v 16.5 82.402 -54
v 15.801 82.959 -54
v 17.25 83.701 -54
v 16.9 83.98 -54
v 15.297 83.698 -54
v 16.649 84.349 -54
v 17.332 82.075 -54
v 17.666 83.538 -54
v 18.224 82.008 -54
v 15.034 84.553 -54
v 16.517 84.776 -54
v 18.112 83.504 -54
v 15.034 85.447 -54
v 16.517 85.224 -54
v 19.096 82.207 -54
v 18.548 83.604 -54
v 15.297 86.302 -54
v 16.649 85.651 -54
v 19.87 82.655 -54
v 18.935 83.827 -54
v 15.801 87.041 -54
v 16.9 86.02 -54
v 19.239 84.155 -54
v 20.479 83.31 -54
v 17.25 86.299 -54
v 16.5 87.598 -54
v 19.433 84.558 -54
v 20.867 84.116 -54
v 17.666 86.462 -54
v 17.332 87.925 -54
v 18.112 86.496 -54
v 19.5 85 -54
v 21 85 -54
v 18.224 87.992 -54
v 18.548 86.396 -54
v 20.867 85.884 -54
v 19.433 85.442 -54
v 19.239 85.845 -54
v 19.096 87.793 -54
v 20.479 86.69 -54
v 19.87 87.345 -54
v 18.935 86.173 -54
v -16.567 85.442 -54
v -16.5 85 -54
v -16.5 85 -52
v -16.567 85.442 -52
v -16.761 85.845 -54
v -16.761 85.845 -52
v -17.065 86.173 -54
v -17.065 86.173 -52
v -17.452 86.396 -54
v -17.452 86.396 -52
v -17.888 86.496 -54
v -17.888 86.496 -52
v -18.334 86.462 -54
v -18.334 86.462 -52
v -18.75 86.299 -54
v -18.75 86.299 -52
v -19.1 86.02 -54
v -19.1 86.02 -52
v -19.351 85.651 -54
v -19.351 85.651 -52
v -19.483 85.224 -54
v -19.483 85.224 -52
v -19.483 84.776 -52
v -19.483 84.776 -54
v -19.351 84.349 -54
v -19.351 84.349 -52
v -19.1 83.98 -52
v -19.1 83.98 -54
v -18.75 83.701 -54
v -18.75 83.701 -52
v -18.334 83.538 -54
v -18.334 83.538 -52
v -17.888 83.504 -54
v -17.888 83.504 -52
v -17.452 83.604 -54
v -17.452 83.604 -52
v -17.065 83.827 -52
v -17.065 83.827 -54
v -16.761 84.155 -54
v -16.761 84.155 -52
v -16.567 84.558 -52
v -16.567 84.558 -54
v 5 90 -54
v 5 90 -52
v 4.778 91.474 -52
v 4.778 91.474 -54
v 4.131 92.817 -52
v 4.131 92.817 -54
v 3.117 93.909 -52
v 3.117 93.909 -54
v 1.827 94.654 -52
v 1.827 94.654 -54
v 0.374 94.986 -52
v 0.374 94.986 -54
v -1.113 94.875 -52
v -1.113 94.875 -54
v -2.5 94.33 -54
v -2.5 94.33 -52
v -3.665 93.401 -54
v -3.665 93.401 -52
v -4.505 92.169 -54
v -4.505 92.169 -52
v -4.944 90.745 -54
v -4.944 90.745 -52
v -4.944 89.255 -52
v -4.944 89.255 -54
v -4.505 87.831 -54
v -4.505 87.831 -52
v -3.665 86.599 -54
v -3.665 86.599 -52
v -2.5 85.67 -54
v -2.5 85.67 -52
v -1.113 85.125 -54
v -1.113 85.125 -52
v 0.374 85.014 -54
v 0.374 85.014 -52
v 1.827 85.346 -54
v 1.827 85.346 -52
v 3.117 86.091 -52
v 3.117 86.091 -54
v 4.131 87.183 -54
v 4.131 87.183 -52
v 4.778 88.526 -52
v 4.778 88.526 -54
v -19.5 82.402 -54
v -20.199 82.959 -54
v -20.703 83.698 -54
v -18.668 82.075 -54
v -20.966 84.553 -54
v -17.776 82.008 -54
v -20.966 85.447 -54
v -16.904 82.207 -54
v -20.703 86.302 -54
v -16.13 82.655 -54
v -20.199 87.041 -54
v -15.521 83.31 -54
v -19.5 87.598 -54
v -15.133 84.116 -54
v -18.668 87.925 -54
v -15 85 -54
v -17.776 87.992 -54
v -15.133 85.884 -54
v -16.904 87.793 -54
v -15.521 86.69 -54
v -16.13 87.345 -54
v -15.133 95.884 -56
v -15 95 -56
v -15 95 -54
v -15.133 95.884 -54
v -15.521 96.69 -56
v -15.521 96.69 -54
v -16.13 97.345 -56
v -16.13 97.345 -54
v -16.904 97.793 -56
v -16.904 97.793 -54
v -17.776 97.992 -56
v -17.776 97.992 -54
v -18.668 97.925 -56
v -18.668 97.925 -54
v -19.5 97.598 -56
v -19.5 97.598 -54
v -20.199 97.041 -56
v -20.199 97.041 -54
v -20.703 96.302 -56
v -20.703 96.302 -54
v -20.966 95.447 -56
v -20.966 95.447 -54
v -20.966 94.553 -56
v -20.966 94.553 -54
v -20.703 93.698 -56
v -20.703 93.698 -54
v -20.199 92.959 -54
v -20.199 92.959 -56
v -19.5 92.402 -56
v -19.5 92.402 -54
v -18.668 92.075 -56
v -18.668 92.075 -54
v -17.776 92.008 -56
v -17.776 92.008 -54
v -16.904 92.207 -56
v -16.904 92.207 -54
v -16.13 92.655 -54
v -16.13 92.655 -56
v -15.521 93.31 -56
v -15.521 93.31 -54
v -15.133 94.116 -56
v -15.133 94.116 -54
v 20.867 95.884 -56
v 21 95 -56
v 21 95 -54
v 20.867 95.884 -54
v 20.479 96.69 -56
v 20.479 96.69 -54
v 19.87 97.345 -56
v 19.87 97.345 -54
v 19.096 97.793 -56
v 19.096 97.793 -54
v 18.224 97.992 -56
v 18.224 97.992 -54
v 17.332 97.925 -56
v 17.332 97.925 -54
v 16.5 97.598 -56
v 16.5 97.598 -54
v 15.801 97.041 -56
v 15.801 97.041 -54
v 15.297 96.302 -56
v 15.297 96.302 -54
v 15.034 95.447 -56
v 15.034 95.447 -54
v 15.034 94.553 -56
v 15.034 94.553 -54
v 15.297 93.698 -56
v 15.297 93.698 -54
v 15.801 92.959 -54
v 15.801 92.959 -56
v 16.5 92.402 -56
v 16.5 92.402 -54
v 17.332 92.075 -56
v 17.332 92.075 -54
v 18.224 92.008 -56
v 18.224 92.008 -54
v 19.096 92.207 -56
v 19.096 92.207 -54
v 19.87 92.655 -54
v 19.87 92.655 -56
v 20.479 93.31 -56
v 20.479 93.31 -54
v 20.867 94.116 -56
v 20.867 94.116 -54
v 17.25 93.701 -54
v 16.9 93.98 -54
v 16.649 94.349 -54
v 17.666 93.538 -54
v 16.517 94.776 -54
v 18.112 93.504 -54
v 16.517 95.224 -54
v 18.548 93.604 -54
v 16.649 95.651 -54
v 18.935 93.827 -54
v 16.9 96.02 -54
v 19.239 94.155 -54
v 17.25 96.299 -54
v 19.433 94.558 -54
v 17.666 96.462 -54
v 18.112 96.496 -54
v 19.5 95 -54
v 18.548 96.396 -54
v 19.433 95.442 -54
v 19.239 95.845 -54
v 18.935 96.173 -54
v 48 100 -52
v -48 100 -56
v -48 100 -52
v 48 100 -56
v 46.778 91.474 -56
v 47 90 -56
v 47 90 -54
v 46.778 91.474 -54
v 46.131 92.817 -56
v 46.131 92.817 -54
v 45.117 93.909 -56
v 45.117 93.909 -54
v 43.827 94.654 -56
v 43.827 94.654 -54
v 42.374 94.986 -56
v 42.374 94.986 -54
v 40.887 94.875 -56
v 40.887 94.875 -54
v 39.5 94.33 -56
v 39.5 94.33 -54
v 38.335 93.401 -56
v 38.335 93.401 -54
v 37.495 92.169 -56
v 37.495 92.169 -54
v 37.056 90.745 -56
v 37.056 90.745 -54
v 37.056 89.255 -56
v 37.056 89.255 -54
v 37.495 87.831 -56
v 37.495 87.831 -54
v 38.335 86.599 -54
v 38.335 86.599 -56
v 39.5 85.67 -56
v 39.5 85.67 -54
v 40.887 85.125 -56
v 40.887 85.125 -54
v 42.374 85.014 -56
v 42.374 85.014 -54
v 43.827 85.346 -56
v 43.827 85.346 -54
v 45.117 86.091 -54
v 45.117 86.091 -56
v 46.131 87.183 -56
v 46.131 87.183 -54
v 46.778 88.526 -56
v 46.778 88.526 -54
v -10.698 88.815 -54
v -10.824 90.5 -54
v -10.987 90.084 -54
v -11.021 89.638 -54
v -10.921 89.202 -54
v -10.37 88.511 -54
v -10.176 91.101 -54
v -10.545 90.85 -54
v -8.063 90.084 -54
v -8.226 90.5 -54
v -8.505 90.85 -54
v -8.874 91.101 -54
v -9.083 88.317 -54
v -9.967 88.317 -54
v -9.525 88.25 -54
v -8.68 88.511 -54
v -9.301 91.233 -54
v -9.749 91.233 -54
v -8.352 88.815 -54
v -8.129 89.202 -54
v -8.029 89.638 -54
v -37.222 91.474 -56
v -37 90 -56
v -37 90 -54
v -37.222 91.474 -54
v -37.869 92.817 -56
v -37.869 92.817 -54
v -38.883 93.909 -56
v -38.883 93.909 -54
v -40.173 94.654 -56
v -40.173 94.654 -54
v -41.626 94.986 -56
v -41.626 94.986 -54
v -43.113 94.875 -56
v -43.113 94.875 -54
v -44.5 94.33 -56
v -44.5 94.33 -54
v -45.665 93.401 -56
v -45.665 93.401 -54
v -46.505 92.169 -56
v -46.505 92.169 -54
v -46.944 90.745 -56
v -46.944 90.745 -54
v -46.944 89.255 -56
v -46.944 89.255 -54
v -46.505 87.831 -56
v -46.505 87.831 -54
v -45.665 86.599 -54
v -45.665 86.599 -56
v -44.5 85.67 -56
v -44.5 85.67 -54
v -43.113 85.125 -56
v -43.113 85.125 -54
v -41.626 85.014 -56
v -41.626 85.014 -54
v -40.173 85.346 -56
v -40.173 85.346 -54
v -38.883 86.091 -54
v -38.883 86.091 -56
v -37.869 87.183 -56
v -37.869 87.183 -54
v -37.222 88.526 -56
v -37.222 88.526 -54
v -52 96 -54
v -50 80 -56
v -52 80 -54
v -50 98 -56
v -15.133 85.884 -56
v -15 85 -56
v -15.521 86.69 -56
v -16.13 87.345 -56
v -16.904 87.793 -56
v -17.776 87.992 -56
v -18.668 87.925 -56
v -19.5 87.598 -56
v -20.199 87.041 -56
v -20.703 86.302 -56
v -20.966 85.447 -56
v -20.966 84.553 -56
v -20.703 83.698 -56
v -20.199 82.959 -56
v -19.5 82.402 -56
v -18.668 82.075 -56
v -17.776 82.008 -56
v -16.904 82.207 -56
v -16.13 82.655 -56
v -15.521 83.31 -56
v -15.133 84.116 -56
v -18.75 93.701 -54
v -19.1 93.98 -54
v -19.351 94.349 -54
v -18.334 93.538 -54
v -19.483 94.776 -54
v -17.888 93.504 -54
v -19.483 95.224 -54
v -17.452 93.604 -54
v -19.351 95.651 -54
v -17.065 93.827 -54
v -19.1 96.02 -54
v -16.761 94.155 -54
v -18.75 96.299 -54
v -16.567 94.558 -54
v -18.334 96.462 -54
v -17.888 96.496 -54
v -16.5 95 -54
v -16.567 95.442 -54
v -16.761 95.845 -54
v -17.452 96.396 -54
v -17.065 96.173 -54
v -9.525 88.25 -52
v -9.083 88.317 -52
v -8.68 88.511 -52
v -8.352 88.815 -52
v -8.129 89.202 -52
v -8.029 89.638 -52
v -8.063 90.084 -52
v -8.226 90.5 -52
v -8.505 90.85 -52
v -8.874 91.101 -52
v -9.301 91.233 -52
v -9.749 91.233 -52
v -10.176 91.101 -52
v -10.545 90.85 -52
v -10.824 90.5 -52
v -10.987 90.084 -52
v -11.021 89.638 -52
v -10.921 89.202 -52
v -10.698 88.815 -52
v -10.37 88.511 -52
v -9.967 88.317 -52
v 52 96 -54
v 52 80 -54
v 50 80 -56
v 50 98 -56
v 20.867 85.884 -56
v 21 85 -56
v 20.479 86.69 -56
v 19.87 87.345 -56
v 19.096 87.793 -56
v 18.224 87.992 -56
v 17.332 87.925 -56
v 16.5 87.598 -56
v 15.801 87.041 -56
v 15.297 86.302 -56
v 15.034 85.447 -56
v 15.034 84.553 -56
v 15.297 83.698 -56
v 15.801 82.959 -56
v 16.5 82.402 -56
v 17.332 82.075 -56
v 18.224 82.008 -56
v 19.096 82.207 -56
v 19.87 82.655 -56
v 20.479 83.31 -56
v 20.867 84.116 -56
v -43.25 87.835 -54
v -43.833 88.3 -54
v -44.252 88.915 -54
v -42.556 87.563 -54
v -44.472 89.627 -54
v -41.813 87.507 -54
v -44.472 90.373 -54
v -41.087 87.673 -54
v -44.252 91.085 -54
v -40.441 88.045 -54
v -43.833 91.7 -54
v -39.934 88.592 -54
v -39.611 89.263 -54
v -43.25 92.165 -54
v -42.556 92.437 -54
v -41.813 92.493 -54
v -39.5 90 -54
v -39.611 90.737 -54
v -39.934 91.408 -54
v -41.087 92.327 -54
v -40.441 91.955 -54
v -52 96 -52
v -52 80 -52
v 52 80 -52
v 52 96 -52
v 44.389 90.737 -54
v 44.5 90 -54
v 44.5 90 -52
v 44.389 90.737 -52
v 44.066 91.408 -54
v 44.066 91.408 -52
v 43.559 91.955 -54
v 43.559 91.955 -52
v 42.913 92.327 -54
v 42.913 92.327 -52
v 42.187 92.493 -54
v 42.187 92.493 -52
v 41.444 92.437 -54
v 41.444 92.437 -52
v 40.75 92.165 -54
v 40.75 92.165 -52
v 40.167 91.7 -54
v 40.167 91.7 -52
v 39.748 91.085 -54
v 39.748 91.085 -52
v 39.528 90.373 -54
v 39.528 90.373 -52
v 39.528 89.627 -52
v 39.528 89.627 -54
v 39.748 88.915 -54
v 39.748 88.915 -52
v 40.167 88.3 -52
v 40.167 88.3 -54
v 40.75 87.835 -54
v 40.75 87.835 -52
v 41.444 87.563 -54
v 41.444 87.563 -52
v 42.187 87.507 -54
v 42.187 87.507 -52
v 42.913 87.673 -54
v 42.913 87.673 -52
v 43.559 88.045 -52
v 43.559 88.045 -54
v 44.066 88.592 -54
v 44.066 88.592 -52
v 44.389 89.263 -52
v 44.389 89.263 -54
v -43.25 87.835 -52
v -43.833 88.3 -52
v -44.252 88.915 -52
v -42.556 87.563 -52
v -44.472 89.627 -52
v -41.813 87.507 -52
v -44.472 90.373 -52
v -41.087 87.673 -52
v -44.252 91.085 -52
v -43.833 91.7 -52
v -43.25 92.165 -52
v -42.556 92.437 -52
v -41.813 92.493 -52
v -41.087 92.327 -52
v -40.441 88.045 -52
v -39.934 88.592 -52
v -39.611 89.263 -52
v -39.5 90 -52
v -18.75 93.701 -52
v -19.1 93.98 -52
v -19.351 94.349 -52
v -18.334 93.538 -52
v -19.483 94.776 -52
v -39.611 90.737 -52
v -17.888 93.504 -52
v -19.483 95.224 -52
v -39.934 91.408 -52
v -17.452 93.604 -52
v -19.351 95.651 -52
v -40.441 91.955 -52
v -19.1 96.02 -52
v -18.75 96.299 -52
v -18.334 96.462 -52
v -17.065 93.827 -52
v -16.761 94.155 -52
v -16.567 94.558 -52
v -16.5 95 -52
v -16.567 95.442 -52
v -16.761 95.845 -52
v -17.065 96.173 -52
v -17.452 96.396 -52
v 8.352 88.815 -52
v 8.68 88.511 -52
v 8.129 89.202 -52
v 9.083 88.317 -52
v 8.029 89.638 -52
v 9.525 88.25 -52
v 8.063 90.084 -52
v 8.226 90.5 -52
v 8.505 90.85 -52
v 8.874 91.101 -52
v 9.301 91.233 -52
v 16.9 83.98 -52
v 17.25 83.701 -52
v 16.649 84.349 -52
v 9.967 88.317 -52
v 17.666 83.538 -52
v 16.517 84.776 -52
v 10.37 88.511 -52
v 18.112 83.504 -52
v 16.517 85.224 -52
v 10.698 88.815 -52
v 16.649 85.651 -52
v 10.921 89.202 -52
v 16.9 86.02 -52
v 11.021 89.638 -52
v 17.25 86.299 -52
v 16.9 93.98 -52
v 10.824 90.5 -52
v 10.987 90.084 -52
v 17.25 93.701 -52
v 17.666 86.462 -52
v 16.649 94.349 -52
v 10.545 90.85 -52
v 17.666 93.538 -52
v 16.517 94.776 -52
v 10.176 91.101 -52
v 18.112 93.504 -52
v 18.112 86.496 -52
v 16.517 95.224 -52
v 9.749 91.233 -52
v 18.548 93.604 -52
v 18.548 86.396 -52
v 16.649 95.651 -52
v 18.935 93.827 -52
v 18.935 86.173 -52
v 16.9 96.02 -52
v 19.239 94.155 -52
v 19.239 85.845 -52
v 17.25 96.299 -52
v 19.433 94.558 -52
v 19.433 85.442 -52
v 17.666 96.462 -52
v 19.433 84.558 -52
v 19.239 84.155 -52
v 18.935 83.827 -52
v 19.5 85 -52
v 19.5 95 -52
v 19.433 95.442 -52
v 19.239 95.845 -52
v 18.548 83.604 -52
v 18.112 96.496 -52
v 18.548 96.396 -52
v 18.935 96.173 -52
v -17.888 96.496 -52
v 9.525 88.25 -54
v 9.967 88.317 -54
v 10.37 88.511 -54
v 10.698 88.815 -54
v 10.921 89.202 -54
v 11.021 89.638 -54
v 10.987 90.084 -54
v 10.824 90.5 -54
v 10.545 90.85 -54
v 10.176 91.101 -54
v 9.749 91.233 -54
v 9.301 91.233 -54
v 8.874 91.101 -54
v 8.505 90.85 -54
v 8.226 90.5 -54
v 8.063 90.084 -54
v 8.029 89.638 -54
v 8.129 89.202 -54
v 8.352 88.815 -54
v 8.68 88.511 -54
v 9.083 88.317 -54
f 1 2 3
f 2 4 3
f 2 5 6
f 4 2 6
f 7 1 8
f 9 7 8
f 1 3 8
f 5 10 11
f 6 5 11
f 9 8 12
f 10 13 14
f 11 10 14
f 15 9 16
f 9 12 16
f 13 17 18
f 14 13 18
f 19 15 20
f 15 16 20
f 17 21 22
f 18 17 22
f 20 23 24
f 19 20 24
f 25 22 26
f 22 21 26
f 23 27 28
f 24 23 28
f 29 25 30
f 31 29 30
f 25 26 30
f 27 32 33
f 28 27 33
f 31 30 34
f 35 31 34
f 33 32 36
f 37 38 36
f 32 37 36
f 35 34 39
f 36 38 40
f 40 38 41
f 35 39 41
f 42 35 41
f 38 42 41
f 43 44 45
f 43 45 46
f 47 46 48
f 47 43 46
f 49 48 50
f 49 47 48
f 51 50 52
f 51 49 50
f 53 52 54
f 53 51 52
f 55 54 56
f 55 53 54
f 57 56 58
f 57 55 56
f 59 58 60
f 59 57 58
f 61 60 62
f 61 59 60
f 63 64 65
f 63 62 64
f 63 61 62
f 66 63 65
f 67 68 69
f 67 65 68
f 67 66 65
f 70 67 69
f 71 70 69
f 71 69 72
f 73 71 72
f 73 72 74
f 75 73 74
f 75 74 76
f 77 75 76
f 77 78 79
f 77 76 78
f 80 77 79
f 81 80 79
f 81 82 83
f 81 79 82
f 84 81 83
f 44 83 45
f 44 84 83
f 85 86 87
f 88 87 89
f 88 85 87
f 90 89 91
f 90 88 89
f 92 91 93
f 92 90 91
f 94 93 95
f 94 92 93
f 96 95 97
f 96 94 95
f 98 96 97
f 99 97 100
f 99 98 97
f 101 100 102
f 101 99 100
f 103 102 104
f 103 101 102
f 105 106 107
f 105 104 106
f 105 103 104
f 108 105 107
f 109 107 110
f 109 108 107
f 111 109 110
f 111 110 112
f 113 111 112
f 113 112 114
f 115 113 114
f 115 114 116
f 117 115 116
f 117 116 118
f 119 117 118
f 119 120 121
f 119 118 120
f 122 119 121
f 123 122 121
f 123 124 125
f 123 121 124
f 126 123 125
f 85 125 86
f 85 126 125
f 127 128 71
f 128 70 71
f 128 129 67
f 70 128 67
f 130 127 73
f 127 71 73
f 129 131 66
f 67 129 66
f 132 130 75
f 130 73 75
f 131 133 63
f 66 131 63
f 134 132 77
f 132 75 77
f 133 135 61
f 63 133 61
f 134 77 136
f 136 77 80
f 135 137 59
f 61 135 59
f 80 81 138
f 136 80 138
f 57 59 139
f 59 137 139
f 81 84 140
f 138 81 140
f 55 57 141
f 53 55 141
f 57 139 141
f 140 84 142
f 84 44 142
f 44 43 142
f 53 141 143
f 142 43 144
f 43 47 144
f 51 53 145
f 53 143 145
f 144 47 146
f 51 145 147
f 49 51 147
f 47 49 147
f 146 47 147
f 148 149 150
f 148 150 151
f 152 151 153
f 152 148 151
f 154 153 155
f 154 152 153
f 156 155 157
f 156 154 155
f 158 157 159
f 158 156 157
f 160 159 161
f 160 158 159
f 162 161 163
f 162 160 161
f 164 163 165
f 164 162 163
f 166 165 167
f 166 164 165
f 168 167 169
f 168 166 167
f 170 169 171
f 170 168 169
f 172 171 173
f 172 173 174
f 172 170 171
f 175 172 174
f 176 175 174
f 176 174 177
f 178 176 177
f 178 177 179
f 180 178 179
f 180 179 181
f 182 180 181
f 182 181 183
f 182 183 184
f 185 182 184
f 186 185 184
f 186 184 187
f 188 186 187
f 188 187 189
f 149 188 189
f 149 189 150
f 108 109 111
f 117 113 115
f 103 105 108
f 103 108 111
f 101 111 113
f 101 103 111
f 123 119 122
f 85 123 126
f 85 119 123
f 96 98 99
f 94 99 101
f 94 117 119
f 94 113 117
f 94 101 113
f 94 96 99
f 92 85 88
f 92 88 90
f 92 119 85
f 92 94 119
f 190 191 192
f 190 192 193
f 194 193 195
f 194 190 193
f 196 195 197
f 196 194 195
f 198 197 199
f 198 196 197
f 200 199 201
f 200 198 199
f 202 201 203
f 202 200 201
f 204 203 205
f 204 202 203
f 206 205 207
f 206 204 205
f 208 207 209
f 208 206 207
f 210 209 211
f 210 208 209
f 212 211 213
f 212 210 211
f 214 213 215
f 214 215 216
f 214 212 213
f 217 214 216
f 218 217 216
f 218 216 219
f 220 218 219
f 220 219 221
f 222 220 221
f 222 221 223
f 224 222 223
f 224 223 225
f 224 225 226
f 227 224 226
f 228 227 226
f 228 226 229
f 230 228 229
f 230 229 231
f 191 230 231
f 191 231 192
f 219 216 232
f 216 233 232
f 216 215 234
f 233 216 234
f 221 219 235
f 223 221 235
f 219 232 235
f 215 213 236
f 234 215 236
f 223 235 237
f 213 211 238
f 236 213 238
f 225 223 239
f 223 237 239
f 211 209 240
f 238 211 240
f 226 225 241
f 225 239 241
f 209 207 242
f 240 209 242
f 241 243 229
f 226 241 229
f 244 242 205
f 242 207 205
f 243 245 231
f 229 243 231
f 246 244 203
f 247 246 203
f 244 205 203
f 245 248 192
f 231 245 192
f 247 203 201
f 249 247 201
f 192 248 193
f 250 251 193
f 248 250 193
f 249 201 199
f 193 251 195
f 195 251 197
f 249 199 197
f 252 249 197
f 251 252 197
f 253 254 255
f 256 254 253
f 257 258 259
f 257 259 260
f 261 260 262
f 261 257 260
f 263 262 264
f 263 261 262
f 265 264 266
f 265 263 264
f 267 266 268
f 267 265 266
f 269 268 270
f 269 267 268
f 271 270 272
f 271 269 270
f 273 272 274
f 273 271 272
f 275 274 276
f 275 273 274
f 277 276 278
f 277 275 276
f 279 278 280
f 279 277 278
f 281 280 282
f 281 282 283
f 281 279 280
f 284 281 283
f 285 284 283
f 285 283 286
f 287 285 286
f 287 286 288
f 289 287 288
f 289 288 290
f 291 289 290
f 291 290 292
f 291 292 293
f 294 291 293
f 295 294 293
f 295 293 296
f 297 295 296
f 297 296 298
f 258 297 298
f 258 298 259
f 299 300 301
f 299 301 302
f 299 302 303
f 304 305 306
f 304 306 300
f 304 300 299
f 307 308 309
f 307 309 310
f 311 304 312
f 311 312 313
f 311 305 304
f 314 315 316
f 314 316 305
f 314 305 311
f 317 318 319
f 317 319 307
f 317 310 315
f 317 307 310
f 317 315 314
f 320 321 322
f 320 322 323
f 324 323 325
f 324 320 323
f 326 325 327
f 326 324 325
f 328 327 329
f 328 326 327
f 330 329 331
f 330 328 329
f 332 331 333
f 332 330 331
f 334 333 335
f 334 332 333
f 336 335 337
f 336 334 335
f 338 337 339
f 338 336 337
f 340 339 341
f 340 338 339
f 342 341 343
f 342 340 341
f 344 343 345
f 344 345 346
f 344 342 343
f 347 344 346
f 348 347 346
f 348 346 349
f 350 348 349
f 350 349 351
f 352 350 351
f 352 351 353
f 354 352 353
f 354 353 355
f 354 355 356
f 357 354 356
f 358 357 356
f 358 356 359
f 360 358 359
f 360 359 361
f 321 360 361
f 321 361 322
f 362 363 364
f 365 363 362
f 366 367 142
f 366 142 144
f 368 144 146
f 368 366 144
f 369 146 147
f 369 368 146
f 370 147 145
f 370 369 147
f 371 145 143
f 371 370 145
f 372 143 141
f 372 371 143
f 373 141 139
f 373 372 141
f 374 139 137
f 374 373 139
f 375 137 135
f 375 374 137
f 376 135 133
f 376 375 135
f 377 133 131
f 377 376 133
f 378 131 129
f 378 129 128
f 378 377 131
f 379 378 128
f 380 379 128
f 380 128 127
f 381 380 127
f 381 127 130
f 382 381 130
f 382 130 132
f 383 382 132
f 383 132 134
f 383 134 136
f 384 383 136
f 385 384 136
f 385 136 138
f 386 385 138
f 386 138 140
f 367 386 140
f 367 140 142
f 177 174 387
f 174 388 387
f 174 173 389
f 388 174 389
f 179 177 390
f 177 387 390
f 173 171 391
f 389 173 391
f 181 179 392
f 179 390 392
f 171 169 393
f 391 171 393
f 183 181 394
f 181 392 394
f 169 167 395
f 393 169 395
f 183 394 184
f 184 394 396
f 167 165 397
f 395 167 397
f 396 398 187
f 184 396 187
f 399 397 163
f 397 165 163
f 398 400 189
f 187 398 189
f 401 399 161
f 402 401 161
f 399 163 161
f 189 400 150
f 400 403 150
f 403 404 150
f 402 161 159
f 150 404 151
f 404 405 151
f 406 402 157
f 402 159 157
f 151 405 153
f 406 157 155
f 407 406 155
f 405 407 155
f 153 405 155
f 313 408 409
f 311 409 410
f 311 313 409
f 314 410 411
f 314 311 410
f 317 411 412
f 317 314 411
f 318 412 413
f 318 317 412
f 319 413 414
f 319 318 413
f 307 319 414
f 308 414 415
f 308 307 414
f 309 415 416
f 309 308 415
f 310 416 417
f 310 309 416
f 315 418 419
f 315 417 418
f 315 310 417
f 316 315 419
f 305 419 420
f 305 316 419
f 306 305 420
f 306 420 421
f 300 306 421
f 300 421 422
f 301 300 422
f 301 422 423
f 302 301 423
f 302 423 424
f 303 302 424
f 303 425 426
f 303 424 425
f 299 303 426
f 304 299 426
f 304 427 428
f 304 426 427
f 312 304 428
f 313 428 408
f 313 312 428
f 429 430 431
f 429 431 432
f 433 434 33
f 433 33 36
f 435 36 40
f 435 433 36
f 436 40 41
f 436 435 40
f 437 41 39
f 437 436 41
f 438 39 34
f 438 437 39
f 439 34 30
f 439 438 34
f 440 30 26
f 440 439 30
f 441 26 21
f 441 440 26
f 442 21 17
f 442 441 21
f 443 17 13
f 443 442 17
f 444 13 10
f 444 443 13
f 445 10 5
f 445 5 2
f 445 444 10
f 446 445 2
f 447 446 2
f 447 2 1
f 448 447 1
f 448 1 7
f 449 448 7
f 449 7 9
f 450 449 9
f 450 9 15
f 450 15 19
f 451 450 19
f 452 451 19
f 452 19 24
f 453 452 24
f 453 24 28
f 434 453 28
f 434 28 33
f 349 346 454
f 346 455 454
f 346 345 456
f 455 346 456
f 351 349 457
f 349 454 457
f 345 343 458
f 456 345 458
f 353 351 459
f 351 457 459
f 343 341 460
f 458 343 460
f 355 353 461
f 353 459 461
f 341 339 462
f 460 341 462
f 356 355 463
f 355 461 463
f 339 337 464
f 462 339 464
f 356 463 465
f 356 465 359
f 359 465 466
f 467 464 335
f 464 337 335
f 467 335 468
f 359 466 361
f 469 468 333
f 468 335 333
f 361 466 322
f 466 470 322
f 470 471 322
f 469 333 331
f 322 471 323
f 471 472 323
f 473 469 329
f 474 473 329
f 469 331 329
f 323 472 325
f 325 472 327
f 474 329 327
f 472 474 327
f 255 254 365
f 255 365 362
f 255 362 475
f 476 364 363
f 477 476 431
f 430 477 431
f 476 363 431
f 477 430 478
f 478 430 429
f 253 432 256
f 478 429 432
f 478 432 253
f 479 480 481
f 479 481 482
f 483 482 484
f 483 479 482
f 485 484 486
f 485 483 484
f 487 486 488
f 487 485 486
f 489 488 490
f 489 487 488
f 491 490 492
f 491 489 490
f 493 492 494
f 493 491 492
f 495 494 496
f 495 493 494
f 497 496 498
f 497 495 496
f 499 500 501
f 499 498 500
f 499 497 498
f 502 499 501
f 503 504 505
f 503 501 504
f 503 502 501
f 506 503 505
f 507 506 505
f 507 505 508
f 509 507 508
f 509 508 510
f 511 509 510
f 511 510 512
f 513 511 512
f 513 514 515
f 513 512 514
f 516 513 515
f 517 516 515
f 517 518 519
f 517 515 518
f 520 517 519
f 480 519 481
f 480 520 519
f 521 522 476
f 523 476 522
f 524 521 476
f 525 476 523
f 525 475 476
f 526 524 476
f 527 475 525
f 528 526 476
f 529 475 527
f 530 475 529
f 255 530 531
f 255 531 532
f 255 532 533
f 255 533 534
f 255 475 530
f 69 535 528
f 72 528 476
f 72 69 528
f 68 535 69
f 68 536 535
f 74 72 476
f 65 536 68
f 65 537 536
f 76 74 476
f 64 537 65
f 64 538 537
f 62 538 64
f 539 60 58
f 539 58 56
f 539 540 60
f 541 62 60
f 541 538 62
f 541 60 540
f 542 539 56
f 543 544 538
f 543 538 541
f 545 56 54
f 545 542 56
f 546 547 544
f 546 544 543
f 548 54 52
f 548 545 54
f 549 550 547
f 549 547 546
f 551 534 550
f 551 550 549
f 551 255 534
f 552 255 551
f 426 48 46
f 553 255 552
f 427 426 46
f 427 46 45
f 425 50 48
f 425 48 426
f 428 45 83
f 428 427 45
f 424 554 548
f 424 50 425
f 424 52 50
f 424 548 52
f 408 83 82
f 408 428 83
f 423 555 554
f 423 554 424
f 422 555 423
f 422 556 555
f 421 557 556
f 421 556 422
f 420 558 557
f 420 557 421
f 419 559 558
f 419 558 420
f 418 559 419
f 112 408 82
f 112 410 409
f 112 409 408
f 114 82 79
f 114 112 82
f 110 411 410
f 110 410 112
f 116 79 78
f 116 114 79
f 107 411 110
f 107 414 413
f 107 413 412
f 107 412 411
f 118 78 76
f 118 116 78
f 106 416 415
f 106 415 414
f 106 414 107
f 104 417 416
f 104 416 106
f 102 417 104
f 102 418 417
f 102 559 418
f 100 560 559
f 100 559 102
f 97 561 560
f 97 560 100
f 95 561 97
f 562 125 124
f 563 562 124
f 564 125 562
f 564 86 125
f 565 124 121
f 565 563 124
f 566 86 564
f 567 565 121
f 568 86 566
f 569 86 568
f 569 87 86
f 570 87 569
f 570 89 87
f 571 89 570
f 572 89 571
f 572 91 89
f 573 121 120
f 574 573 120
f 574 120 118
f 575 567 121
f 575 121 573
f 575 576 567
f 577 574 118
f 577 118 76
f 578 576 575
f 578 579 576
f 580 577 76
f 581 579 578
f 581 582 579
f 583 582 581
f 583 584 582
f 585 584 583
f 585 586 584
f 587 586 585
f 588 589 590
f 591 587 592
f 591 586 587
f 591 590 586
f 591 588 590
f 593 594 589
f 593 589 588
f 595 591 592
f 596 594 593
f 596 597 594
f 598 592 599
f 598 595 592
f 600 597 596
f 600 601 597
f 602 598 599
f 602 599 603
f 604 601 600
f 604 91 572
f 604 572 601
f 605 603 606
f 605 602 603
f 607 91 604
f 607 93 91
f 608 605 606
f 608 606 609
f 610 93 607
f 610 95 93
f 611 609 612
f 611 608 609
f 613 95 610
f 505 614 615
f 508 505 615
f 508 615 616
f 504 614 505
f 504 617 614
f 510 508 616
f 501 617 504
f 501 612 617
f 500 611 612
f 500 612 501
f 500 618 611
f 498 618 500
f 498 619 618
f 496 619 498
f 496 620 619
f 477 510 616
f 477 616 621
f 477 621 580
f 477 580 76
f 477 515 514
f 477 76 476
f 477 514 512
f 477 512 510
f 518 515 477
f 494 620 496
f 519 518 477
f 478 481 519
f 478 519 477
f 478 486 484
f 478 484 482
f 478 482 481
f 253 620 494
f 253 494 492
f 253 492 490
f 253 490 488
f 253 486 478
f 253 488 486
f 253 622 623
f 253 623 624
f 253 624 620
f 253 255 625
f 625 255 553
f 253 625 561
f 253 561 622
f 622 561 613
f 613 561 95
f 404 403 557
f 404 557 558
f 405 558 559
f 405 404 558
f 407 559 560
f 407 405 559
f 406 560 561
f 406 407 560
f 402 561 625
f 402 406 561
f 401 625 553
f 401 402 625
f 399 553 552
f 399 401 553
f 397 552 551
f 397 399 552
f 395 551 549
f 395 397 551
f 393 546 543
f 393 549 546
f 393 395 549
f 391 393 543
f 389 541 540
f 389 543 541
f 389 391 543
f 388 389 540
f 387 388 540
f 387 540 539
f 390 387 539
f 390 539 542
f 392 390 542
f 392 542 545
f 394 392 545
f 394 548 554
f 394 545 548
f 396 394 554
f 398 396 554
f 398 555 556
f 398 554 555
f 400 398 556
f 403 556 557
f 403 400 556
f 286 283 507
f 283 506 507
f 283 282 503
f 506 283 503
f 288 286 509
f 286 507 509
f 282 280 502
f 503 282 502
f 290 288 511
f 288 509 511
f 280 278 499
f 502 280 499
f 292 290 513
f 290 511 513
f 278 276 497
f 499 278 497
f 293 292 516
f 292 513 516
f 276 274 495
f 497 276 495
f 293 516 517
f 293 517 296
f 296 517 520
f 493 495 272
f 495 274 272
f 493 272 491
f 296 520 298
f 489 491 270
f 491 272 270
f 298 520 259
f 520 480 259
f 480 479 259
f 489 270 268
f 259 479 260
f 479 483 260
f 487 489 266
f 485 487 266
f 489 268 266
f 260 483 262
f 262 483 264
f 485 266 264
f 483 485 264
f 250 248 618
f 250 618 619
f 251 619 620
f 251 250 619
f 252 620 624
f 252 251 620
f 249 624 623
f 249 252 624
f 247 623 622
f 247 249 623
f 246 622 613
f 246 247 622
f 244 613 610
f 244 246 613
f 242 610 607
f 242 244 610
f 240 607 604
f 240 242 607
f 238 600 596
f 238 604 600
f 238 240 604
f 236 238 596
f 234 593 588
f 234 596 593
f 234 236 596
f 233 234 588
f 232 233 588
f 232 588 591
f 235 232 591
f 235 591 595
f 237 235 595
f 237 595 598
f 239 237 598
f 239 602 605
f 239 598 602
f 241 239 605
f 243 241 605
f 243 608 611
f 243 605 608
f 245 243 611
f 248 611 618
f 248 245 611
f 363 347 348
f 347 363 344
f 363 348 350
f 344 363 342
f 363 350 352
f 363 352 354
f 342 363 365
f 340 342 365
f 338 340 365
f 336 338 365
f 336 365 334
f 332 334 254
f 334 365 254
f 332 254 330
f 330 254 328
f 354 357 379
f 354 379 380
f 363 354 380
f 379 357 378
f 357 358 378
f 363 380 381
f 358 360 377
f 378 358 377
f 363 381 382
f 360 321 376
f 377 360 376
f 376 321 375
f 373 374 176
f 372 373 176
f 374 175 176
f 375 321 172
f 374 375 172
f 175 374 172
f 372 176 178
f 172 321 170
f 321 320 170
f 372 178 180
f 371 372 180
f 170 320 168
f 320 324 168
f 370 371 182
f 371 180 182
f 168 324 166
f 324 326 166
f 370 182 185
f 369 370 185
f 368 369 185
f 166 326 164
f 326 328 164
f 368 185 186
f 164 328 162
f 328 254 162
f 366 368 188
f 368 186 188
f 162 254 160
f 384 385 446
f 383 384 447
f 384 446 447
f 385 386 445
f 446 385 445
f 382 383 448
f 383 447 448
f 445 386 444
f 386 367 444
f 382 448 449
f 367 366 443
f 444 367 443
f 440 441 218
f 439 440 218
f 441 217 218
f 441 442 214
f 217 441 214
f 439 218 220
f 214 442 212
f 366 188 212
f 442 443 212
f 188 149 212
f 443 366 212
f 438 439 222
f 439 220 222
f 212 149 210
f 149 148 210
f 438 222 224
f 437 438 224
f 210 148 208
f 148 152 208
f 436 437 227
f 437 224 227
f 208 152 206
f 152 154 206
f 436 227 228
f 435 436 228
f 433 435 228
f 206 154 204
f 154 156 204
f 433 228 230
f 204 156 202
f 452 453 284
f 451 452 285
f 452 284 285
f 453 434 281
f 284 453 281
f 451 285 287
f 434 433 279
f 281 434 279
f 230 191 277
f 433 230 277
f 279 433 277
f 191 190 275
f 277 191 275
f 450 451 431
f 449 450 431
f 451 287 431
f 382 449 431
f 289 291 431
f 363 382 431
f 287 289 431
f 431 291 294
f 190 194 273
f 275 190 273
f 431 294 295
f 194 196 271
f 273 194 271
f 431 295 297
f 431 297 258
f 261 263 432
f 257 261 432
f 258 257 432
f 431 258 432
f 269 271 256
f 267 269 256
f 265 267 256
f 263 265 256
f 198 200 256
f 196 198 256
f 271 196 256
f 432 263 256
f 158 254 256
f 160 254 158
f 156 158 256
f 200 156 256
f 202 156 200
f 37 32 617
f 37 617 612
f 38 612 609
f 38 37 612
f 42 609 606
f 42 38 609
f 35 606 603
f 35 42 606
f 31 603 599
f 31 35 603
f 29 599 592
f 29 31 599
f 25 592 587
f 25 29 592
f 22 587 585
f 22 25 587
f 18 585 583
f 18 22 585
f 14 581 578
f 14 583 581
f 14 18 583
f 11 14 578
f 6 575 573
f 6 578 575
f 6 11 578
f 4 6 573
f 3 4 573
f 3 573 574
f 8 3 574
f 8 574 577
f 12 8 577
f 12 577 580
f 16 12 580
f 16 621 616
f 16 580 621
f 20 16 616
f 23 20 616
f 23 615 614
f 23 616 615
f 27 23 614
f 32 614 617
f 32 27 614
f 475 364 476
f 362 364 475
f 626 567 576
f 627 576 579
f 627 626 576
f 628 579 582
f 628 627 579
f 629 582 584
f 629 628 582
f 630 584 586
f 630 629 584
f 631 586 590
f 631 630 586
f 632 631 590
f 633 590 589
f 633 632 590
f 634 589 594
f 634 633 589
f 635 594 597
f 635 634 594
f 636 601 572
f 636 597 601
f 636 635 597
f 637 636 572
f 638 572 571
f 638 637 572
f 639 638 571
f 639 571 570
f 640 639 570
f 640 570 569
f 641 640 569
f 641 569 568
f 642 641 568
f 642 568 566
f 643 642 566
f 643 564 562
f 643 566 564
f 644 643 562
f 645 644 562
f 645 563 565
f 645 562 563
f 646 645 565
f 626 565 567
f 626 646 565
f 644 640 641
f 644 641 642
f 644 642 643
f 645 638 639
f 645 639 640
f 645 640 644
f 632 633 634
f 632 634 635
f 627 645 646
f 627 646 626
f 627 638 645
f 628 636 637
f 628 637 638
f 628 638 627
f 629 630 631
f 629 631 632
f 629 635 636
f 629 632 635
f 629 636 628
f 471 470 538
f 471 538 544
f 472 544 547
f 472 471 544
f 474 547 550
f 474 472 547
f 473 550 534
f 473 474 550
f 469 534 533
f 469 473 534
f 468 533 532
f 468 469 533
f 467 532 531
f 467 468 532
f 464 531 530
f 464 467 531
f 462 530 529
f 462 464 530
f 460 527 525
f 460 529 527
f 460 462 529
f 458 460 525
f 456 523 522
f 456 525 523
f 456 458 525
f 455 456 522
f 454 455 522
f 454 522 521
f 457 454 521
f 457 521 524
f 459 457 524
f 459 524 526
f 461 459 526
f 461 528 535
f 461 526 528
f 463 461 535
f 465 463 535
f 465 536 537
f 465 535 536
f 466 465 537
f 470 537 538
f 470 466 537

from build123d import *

# Parameters (mm, degrees)
CYLINDER1697_R              = 1.5
CYLINDER1697_DEPTH          = 20
CYLINDER1698_R              = 1.5
CYLINDER1698_DEPTH          = 20
COMPOUND842_ROLL_ANGLE      = 90
COMPOUND842_PLACEMENT_ANGLE = 90
CYLINDER1690_R              = 2.5
CYLINDER1690_DEPTH          = 20
CYLINDER1689_R              = 2.5
CYLINDER1689_DEPTH          = 20
CYLINDER1696_R              = 5
CYLINDER1696_DEPTH          = 5
CYLINDER1687_R              = 5
CYLINDER1687_DEPTH          = 5
CYLINDER1695_R              = 3
CYLINDER1695_DEPTH          = 3
CYLINDER1692_R              = 3
CYLINDER1692_DEPTH          = 3
CYLINDER1693_R              = 3
CYLINDER1693_DEPTH          = 3
CYLINDER1694_R              = 3
CYLINDER1694_DEPTH          = 3
CYLINDER1682_R              = 1.5
CYLINDER1682_DEPTH          = 60
CYLINDER1685_R              = 1.5
CYLINDER1685_DEPTH          = 60
CYLINDER1683_R              = 1.5
CYLINDER1683_DEPTH          = 60
CYLINDER1681_R              = 1.5
CYLINDER1681_DEPTH          = 60
CYLINDER1677_R              = 5
CYLINDER1677_DEPTH          = 5
BOX657_W                    = 104
BOX657_H                    = 20
BOX657_DEPTH                = 4
CHAMFER049_SIZE             = 4
CHAMFER050_SIZE             = 2


with BuildPart() as v_lec1697:
    # Cylinder1697 → Cylinder1697 (new body)
    with BuildSketch(Plane(origin=(15.75, 114, 58.525), x_dir=(-1, 0, 0), z_dir=(0, 1, 0))):
        Circle(CYLINDER1697_R)
    extrude(amount=CYLINDER1697_DEPTH)


with BuildPart() as compound840:
    # Cylinder1698 → Cylinder1698 (new body)
    with BuildSketch(Plane(origin=(15.75, 114, 39.475), x_dir=(-1, 0, 0), z_dir=(0, 1, 0))):
        Circle(CYLINDER1698_R)
    extrude(amount=CYLINDER1698_DEPTH)

    # Compound842: union Válec1697
    add(v_lec1697.part)


with BuildPart() as compound840_1:
    # Compound842 roll: moved
    add(compound840.part.rotate(Axis((0, 0, 0), (1, 0, 0)), COMPOUND842_ROLL_ANGLE))


with BuildPart() as compound840_2:
    # Compound842 placement: moved
    add(compound840_1.part.moved(Location((-49, 0, -96))).rotate(Axis((-49, 0, -96), (0, 0, 1)), COMPOUND842_PLACEMENT_ANGLE))


with BuildPart() as compound840_3:
    # Compound840 placement: moved
    add(compound840_2.part.moved(Location((0, 74, -72))))


with BuildPart() as v_lec1690:
    # Cylinder1690 → Cylinder1690 (new body)
    with BuildSketch(Plane(origin=(-42, 90, -59), x_dir=(1, 0, 0), z_dir=(0, 0, 1))):
        Circle(CYLINDER1690_R)
    extrude(amount=CYLINDER1690_DEPTH)


with BuildPart() as compound837:
    # Cylinder1689 → Cylinder1689 (new body)
    with BuildSketch(Plane(origin=(42, 90, -59), x_dir=(1, 0, 0), z_dir=(0, 0, 1))):
        Circle(CYLINDER1689_R)
    extrude(amount=CYLINDER1689_DEPTH)

    # Compound837: union Válec1690
    add(v_lec1690.part)


with BuildPart() as v_lec1696:
    # Cylinder1696 → Cylinder1696 (new body)
    with BuildSketch(Plane(origin=(-42, 90, -59), x_dir=(1, 0, 0), z_dir=(0, 0, 1))):
        Circle(CYLINDER1696_R)
    extrude(amount=CYLINDER1696_DEPTH)


with BuildPart() as compound836:
    # Cylinder1687 → Cylinder1687 (new body)
    with BuildSketch(Plane(origin=(42, 90, -59), x_dir=(1, 0, 0), z_dir=(0, 0, 1))):
        Circle(CYLINDER1687_R)
    extrude(amount=CYLINDER1687_DEPTH)

    # Compound836: union Válec1696
    add(v_lec1696.part)


with BuildPart() as v_lec1695:
    # Cylinder1695 → Cylinder1695 (new body)
    with BuildSketch(Plane(origin=(18, 85, -57), x_dir=(1, 0, 0), z_dir=(0, 0, 1))):
        Circle(CYLINDER1695_R)
    extrude(amount=CYLINDER1695_DEPTH)


with BuildPart() as v_lec1692:
    # Cylinder1692 → Cylinder1692 (new body)
    with BuildSketch(Plane(origin=(-18, 85, -57), x_dir=(1, 0, 0), z_dir=(0, 0, 1))):
        Circle(CYLINDER1692_R)
    extrude(amount=CYLINDER1692_DEPTH)


with BuildPart() as v_lec1693:
    # Cylinder1693 → Cylinder1693 (new body)
    with BuildSketch(Plane(origin=(-18, 95, -57), x_dir=(1, 0, 0), z_dir=(0, 0, 1))):
        Circle(CYLINDER1693_R)
    extrude(amount=CYLINDER1693_DEPTH)


with BuildPart() as compound834:
    # Cylinder1694 → Cylinder1694 (new body)
    with BuildSketch(Plane(origin=(18, 95, -57), x_dir=(1, 0, 0), z_dir=(0, 0, 1))):
        Circle(CYLINDER1694_R)
    extrude(amount=CYLINDER1694_DEPTH)

    # Compound834: union Válec1695, Válec1692, Válec1693
    add(v_lec1695.part)
    add(v_lec1692.part)
    add(v_lec1693.part)


with BuildPart() as v_lec1682:
    # Cylinder1682 → Cylinder1682 (new body)
    with BuildSketch(Plane(origin=(18, 85, -57), x_dir=(1, 0, 0), z_dir=(0, 0, 1))):
        Circle(CYLINDER1682_R)
    extrude(amount=CYLINDER1682_DEPTH)


with BuildPart() as v_lec1685:
    # Cylinder1685 → Cylinder1685 (new body)
    with BuildSketch(Plane(origin=(-18, 85, -57), x_dir=(1, 0, 0), z_dir=(0, 0, 1))):
        Circle(CYLINDER1685_R)
    extrude(amount=CYLINDER1685_DEPTH)


with BuildPart() as v_lec1683:
    # Cylinder1683 → Cylinder1683 (new body)
    with BuildSketch(Plane(origin=(-18, 95, -57), x_dir=(1, 0, 0), z_dir=(0, 0, 1))):
        Circle(CYLINDER1683_R)
    extrude(amount=CYLINDER1683_DEPTH)


with BuildPart() as compound833:
    # Cylinder1681 → Cylinder1681 (new body)
    with BuildSketch(Plane(origin=(18, 95, -57), x_dir=(1, 0, 0), z_dir=(0, 0, 1))):
        Circle(CYLINDER1681_R)
    extrude(amount=CYLINDER1681_DEPTH)

    # Compound833: union Válec1682, Válec1685, Válec1683
    add(v_lec1682.part)
    add(v_lec1685.part)
    add(v_lec1683.part)


with BuildPart() as v_lec1677:
    # Cylinder1677 → Cylinder1677 (new body)
    with BuildSketch(Plane(origin=(0, 90, -54), x_dir=(1, 0, 0), z_dir=(0, 0, 1))):
        Circle(CYLINDER1677_R)
    extrude(amount=CYLINDER1677_DEPTH)


with BuildPart() as cut344:
    # Box657 → Box657 (new body)
    with BuildSketch(Plane(origin=(-52, 80, -56), x_dir=(1, 0, 0), z_dir=(0, 0, 1))):
        with Locations((52, 10)):
            Rectangle(BOX657_W, BOX657_H)
    extrude(amount=BOX657_DEPTH)

    # Cut337: cut Válec1677
    add(v_lec1677.part, mode=Mode.SUBTRACT)

    # Cut339: cut Compound833
    add(compound833.part, mode=Mode.SUBTRACT)

    # Cut340: cut Compound834
    add(compound834.part, mode=Mode.SUBTRACT)

    # Cut338: cut Compound836
    add(compound836.part, mode=Mode.SUBTRACT)

    # Cut341: cut Compound837
    add(compound837.part, mode=Mode.SUBTRACT)

    # Chamfer049
    chamfer049_edges = [cut344.edges().sort_by_distance(p)[0] for p in [
        (-52, 100, -54),
        (52, 100, -54),
    ]]
    chamfer(chamfer049_edges, length=CHAMFER049_SIZE)

    # Chamfer050
    chamfer050_edges = [cut344.edges().sort_by_distance(p)[0] for p in [
        (-52, 88, -56),
        (52, 88, -56),
    ]]
    chamfer(chamfer050_edges, length=CHAMFER050_SIZE)

    # Cut344: cut Compound840
    add(compound840_3.part, mode=Mode.SUBTRACT)


solid = cut344.part
